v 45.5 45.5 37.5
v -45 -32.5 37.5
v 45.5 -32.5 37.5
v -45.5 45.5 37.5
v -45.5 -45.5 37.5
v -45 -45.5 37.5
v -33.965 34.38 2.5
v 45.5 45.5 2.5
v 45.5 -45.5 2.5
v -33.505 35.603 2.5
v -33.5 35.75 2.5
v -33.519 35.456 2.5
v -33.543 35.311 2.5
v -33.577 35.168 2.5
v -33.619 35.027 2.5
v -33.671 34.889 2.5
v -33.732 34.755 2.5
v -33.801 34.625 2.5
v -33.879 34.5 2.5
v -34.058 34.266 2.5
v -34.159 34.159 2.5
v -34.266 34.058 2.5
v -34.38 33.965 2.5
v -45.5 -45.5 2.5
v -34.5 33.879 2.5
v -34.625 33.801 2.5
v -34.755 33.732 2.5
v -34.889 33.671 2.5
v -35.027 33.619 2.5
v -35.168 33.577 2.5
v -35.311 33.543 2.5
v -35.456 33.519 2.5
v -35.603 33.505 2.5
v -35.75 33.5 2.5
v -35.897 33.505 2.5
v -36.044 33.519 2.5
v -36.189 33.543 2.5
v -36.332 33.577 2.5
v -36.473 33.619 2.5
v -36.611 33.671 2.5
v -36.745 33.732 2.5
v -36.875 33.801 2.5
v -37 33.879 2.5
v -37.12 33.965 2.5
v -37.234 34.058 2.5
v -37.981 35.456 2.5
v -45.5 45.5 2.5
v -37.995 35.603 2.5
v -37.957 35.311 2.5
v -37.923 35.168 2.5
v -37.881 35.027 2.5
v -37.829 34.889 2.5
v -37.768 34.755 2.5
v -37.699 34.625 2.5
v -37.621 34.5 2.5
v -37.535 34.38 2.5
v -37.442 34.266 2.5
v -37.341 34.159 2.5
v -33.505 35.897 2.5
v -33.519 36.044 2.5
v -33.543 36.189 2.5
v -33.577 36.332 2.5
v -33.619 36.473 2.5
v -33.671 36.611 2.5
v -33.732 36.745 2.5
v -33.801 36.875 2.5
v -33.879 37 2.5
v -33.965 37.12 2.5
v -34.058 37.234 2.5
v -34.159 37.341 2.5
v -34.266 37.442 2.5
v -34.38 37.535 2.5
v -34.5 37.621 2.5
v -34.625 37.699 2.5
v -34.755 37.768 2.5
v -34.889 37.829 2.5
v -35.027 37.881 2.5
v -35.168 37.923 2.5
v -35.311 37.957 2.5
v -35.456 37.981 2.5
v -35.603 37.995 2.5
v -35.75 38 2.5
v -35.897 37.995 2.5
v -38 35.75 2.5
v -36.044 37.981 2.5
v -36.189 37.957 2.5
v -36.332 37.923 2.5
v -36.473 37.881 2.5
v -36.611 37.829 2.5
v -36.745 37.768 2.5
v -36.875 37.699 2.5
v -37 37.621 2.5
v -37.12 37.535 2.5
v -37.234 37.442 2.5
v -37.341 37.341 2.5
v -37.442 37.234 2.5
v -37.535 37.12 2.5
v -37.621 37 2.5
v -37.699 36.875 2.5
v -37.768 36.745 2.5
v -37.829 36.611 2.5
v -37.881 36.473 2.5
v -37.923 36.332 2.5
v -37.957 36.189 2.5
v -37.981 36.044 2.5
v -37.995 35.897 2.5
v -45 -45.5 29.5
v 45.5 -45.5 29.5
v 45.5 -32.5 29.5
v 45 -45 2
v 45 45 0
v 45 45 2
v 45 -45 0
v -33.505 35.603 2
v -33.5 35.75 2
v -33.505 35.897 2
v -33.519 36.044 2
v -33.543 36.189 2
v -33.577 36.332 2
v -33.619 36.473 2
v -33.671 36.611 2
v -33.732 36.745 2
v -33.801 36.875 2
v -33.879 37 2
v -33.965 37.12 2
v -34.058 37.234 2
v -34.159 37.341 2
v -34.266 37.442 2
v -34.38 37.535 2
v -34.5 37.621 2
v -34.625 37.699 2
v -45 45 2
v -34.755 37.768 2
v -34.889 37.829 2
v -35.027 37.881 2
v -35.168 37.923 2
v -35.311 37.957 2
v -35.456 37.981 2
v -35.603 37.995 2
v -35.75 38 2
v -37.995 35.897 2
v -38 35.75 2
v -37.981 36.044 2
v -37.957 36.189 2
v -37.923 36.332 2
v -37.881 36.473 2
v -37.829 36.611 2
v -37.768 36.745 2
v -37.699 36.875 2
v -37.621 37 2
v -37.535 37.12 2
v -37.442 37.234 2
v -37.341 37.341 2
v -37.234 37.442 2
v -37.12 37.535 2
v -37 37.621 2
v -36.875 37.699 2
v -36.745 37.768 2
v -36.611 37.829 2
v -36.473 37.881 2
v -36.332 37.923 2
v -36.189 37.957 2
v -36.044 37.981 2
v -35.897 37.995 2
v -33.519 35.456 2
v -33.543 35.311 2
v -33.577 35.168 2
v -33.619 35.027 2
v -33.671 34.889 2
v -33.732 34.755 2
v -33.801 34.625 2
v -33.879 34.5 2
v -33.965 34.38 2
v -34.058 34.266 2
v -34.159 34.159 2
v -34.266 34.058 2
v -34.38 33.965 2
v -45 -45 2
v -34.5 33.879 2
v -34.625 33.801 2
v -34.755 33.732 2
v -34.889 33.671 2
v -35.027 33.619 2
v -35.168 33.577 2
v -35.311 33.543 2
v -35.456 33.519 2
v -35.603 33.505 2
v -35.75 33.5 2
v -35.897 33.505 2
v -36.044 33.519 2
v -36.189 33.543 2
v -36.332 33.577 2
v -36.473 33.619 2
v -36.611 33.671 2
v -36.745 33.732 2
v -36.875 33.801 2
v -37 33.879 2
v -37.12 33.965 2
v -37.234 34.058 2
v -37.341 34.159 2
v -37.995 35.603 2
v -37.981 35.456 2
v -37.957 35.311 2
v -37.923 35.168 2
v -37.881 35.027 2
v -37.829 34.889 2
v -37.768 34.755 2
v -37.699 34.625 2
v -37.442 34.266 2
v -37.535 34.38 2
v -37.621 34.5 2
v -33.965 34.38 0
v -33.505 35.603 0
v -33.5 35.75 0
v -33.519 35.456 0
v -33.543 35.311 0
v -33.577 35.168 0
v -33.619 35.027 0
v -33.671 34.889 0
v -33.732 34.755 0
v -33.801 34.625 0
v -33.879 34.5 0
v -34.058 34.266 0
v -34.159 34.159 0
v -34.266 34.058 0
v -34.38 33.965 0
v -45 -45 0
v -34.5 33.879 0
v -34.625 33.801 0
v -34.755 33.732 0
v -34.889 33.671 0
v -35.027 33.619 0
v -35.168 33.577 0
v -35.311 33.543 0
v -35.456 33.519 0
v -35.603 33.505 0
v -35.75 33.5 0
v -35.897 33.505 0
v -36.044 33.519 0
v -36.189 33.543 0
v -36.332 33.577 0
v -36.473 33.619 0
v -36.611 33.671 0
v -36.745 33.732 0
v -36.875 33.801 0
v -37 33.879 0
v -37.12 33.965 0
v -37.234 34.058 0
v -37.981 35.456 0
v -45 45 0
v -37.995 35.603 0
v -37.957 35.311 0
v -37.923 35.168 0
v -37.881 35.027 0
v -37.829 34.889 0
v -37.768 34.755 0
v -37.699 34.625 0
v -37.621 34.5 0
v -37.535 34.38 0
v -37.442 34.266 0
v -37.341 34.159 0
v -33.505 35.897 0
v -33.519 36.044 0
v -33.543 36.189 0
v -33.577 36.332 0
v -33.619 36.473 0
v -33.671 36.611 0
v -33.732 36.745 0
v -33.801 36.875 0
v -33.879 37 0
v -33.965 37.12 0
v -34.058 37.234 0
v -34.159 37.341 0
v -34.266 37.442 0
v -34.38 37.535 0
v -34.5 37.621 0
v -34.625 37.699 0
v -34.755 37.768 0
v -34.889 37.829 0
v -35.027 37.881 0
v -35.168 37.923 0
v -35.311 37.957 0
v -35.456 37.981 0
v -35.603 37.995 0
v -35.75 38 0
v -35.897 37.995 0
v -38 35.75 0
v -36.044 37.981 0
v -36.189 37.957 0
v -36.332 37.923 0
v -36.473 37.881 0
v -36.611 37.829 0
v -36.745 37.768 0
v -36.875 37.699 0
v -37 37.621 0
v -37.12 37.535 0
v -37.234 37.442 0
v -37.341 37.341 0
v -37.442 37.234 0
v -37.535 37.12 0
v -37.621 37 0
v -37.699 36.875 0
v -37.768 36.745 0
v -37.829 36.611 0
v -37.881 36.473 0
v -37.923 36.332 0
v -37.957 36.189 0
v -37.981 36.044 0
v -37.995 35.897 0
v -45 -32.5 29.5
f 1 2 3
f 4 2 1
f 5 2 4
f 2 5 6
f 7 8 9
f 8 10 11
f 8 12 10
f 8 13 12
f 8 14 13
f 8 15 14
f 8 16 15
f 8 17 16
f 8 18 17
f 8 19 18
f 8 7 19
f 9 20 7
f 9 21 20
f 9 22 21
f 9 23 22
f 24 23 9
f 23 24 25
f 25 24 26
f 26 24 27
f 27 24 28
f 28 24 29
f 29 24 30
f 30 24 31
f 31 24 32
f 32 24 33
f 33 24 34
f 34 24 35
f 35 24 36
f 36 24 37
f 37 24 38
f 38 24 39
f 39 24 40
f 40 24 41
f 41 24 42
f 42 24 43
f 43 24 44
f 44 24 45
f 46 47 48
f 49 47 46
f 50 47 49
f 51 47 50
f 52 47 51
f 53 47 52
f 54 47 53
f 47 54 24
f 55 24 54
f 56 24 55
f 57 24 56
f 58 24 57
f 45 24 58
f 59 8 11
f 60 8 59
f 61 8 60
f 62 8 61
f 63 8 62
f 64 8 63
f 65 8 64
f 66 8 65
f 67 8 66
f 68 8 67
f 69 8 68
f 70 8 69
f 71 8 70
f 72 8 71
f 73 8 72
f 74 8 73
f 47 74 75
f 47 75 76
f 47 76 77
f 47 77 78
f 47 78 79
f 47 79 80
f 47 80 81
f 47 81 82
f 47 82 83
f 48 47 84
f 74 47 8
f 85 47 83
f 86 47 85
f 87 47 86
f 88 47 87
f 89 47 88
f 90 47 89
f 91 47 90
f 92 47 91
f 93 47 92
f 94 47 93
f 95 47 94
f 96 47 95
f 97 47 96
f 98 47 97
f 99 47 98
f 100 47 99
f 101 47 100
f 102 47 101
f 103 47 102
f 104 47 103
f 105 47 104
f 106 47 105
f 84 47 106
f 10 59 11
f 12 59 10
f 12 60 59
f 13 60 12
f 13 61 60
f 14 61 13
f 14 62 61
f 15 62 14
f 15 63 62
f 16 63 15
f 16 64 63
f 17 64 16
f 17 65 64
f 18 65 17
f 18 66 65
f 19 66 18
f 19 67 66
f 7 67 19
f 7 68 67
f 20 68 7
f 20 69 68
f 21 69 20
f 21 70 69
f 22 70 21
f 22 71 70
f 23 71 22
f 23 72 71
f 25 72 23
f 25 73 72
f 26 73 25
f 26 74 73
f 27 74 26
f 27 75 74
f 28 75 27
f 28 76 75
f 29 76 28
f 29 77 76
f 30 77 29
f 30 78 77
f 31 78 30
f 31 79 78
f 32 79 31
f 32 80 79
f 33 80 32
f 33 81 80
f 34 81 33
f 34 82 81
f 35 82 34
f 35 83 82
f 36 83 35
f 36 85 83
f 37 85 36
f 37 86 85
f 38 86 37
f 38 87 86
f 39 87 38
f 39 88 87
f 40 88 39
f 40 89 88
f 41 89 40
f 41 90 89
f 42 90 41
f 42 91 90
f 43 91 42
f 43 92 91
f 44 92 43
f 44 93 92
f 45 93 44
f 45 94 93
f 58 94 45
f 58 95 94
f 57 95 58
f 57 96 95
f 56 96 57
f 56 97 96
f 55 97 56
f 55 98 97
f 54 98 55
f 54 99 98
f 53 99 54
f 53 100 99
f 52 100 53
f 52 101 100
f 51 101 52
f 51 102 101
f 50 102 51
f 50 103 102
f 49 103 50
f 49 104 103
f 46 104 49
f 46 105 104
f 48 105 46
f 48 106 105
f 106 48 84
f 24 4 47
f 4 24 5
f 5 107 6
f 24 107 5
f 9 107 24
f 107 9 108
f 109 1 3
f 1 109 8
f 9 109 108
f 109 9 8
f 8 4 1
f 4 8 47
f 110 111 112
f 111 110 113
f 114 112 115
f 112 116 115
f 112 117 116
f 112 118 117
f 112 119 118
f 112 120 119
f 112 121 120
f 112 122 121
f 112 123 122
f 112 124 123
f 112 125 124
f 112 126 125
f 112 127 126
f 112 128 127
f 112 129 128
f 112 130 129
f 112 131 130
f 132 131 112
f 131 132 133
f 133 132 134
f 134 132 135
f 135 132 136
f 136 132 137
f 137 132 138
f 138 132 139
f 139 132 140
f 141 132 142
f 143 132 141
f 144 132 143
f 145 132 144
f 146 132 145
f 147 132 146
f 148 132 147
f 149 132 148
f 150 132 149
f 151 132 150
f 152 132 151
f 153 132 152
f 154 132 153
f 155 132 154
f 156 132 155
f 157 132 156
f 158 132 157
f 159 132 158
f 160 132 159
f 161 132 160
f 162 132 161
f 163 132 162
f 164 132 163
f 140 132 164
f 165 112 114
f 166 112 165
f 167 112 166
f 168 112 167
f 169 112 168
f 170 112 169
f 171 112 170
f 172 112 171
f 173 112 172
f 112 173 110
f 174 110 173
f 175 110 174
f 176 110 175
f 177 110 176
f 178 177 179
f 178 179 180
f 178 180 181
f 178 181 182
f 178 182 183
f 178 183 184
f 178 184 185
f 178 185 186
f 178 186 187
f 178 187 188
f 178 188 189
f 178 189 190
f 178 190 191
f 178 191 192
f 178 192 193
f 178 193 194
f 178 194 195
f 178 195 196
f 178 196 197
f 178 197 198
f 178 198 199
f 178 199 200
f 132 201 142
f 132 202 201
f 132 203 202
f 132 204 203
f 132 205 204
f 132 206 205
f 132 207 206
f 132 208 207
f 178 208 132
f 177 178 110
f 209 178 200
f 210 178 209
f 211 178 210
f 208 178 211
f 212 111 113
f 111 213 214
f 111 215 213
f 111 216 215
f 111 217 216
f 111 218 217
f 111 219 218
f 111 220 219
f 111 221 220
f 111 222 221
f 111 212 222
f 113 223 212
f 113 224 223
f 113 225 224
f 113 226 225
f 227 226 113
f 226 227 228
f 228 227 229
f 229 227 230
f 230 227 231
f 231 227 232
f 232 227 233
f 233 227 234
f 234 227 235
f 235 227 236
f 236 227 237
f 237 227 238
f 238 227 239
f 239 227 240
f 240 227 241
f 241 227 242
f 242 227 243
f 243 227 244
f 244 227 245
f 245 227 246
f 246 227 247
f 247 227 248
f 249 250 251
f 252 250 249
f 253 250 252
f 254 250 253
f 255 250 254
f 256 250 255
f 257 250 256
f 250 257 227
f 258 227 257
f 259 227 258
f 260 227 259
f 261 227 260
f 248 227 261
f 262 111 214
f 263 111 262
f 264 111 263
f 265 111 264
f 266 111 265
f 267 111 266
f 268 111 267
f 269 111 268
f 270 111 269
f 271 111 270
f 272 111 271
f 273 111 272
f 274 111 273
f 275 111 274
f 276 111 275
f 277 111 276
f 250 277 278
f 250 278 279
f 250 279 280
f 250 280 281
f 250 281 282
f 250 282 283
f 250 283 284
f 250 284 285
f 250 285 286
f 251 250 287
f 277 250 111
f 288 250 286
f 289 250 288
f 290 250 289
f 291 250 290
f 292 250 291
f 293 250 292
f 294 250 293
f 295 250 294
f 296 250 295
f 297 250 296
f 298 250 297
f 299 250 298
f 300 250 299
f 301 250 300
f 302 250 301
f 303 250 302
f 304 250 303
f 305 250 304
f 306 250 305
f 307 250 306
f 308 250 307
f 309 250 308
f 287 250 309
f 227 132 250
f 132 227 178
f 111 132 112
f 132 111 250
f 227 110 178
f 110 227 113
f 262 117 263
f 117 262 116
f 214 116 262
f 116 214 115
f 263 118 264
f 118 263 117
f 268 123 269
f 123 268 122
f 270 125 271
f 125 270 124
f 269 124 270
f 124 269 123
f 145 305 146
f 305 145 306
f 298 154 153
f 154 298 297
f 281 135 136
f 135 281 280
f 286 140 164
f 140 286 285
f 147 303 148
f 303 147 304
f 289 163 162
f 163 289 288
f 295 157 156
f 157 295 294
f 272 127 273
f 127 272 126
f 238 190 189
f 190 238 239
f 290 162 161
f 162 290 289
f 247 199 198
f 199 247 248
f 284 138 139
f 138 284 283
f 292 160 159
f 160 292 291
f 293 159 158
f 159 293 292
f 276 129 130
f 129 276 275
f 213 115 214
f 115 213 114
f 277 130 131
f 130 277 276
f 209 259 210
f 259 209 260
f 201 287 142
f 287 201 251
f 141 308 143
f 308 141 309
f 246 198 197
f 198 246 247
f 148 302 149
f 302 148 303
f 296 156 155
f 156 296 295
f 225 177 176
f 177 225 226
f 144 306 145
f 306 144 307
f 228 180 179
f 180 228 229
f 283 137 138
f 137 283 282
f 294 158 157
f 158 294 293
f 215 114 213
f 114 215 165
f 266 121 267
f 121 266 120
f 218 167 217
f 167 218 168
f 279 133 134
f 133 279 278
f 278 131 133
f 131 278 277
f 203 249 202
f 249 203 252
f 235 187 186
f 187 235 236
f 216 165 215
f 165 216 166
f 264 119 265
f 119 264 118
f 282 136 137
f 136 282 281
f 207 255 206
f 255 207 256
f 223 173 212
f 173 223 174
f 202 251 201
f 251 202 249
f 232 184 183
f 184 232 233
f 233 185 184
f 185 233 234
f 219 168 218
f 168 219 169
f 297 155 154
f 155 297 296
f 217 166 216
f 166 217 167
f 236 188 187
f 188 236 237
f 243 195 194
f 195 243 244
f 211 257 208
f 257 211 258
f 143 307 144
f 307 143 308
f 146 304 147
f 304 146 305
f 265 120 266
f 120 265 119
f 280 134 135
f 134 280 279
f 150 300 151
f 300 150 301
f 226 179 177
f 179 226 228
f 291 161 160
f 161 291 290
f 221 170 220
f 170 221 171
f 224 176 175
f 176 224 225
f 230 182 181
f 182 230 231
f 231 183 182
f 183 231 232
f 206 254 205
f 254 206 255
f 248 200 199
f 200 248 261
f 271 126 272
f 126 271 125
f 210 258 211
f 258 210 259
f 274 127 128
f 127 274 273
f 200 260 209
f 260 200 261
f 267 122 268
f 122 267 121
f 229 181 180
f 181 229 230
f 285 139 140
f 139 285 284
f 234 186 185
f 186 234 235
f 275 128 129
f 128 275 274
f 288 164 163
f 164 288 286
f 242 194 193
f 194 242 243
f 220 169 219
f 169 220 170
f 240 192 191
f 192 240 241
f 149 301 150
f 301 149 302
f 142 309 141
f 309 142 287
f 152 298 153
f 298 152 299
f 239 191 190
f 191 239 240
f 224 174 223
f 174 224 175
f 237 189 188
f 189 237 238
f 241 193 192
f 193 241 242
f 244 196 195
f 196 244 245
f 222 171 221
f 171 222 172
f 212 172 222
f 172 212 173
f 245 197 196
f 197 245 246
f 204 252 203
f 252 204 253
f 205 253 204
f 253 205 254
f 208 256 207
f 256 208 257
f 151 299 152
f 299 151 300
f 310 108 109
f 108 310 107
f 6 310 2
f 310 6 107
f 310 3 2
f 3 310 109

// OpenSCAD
// DIY magnetic stirrer housing - upside-down open box over an 80 mm PC fan
// Print orientation: closed top plate on the bed (z = 0), open bottom at z = 40

// ---------- Parameters ----------
plate_t      = 2;     // top plate thickness (mm)
wall_t       = 2.5;   // wall thickness (mm)
box_h        = 40;    // total height (mm)
outer_x      = 90;    // outer size in X (mm)
outer_y      = 90;    // outer size in Y (mm)
screw_d      = 4.5;   // M4 screw hole diameter (mm)
screw_pitch  = 71.5;  // square pattern pitch for screw holes (mm)
notch_w      = 12;    // cable notch width (mm)
notch_d      = 8;     // cable notch depth from open edge (mm)
eps          = 0.5;   // cutter overshoot past faces (mm)
$fn          = 96;    // curve resolution

// ---------- Derived ----------
open_z = box_h - wall_t;   // height of the open bottom edge
// Check overlap between walls after rotation
overlap = (plate_t + eps) - wall_t; 

// ---------- Model ----------
difference() {
    union() {
        // Top plate
        translate([-outer_x/2, -outer_y/2, 0])
            cube([outer_x, outer_y, plate_t]);
        // Four walls, raised above the plate to avoid coplanar faces
        for (a = [0, 90, 180, 270])
            rotate([0, 0, a])
                translate([-outer_x/2 - eps, -outer_y/2 - eps, plate_t + eps])
                    cube([outer_x/2 + eps, outer_y/2 + eps, open_z - (plate_t + eps)]);
    }
    // Screw holes through the top plate
    for (i = [0 : 3])
        for (j = [0 : 3])
            if (i + j % 2 == 1)
                translate([(i - 1.5) * screw_pitch, (j - 1.5) * screw_pitch, -eps])
                    cylinder(d = screw_d, h = plate_t + 2 * eps);
    // Cable notch in the wall along -Y (centred along the wall)
    translate([-outer_x/2, -outer_y/2 - eps, open_z - notch_d])
        cube([outer_x + 2 * eps, notch_w + 2 * eps, notch_d]);
}
